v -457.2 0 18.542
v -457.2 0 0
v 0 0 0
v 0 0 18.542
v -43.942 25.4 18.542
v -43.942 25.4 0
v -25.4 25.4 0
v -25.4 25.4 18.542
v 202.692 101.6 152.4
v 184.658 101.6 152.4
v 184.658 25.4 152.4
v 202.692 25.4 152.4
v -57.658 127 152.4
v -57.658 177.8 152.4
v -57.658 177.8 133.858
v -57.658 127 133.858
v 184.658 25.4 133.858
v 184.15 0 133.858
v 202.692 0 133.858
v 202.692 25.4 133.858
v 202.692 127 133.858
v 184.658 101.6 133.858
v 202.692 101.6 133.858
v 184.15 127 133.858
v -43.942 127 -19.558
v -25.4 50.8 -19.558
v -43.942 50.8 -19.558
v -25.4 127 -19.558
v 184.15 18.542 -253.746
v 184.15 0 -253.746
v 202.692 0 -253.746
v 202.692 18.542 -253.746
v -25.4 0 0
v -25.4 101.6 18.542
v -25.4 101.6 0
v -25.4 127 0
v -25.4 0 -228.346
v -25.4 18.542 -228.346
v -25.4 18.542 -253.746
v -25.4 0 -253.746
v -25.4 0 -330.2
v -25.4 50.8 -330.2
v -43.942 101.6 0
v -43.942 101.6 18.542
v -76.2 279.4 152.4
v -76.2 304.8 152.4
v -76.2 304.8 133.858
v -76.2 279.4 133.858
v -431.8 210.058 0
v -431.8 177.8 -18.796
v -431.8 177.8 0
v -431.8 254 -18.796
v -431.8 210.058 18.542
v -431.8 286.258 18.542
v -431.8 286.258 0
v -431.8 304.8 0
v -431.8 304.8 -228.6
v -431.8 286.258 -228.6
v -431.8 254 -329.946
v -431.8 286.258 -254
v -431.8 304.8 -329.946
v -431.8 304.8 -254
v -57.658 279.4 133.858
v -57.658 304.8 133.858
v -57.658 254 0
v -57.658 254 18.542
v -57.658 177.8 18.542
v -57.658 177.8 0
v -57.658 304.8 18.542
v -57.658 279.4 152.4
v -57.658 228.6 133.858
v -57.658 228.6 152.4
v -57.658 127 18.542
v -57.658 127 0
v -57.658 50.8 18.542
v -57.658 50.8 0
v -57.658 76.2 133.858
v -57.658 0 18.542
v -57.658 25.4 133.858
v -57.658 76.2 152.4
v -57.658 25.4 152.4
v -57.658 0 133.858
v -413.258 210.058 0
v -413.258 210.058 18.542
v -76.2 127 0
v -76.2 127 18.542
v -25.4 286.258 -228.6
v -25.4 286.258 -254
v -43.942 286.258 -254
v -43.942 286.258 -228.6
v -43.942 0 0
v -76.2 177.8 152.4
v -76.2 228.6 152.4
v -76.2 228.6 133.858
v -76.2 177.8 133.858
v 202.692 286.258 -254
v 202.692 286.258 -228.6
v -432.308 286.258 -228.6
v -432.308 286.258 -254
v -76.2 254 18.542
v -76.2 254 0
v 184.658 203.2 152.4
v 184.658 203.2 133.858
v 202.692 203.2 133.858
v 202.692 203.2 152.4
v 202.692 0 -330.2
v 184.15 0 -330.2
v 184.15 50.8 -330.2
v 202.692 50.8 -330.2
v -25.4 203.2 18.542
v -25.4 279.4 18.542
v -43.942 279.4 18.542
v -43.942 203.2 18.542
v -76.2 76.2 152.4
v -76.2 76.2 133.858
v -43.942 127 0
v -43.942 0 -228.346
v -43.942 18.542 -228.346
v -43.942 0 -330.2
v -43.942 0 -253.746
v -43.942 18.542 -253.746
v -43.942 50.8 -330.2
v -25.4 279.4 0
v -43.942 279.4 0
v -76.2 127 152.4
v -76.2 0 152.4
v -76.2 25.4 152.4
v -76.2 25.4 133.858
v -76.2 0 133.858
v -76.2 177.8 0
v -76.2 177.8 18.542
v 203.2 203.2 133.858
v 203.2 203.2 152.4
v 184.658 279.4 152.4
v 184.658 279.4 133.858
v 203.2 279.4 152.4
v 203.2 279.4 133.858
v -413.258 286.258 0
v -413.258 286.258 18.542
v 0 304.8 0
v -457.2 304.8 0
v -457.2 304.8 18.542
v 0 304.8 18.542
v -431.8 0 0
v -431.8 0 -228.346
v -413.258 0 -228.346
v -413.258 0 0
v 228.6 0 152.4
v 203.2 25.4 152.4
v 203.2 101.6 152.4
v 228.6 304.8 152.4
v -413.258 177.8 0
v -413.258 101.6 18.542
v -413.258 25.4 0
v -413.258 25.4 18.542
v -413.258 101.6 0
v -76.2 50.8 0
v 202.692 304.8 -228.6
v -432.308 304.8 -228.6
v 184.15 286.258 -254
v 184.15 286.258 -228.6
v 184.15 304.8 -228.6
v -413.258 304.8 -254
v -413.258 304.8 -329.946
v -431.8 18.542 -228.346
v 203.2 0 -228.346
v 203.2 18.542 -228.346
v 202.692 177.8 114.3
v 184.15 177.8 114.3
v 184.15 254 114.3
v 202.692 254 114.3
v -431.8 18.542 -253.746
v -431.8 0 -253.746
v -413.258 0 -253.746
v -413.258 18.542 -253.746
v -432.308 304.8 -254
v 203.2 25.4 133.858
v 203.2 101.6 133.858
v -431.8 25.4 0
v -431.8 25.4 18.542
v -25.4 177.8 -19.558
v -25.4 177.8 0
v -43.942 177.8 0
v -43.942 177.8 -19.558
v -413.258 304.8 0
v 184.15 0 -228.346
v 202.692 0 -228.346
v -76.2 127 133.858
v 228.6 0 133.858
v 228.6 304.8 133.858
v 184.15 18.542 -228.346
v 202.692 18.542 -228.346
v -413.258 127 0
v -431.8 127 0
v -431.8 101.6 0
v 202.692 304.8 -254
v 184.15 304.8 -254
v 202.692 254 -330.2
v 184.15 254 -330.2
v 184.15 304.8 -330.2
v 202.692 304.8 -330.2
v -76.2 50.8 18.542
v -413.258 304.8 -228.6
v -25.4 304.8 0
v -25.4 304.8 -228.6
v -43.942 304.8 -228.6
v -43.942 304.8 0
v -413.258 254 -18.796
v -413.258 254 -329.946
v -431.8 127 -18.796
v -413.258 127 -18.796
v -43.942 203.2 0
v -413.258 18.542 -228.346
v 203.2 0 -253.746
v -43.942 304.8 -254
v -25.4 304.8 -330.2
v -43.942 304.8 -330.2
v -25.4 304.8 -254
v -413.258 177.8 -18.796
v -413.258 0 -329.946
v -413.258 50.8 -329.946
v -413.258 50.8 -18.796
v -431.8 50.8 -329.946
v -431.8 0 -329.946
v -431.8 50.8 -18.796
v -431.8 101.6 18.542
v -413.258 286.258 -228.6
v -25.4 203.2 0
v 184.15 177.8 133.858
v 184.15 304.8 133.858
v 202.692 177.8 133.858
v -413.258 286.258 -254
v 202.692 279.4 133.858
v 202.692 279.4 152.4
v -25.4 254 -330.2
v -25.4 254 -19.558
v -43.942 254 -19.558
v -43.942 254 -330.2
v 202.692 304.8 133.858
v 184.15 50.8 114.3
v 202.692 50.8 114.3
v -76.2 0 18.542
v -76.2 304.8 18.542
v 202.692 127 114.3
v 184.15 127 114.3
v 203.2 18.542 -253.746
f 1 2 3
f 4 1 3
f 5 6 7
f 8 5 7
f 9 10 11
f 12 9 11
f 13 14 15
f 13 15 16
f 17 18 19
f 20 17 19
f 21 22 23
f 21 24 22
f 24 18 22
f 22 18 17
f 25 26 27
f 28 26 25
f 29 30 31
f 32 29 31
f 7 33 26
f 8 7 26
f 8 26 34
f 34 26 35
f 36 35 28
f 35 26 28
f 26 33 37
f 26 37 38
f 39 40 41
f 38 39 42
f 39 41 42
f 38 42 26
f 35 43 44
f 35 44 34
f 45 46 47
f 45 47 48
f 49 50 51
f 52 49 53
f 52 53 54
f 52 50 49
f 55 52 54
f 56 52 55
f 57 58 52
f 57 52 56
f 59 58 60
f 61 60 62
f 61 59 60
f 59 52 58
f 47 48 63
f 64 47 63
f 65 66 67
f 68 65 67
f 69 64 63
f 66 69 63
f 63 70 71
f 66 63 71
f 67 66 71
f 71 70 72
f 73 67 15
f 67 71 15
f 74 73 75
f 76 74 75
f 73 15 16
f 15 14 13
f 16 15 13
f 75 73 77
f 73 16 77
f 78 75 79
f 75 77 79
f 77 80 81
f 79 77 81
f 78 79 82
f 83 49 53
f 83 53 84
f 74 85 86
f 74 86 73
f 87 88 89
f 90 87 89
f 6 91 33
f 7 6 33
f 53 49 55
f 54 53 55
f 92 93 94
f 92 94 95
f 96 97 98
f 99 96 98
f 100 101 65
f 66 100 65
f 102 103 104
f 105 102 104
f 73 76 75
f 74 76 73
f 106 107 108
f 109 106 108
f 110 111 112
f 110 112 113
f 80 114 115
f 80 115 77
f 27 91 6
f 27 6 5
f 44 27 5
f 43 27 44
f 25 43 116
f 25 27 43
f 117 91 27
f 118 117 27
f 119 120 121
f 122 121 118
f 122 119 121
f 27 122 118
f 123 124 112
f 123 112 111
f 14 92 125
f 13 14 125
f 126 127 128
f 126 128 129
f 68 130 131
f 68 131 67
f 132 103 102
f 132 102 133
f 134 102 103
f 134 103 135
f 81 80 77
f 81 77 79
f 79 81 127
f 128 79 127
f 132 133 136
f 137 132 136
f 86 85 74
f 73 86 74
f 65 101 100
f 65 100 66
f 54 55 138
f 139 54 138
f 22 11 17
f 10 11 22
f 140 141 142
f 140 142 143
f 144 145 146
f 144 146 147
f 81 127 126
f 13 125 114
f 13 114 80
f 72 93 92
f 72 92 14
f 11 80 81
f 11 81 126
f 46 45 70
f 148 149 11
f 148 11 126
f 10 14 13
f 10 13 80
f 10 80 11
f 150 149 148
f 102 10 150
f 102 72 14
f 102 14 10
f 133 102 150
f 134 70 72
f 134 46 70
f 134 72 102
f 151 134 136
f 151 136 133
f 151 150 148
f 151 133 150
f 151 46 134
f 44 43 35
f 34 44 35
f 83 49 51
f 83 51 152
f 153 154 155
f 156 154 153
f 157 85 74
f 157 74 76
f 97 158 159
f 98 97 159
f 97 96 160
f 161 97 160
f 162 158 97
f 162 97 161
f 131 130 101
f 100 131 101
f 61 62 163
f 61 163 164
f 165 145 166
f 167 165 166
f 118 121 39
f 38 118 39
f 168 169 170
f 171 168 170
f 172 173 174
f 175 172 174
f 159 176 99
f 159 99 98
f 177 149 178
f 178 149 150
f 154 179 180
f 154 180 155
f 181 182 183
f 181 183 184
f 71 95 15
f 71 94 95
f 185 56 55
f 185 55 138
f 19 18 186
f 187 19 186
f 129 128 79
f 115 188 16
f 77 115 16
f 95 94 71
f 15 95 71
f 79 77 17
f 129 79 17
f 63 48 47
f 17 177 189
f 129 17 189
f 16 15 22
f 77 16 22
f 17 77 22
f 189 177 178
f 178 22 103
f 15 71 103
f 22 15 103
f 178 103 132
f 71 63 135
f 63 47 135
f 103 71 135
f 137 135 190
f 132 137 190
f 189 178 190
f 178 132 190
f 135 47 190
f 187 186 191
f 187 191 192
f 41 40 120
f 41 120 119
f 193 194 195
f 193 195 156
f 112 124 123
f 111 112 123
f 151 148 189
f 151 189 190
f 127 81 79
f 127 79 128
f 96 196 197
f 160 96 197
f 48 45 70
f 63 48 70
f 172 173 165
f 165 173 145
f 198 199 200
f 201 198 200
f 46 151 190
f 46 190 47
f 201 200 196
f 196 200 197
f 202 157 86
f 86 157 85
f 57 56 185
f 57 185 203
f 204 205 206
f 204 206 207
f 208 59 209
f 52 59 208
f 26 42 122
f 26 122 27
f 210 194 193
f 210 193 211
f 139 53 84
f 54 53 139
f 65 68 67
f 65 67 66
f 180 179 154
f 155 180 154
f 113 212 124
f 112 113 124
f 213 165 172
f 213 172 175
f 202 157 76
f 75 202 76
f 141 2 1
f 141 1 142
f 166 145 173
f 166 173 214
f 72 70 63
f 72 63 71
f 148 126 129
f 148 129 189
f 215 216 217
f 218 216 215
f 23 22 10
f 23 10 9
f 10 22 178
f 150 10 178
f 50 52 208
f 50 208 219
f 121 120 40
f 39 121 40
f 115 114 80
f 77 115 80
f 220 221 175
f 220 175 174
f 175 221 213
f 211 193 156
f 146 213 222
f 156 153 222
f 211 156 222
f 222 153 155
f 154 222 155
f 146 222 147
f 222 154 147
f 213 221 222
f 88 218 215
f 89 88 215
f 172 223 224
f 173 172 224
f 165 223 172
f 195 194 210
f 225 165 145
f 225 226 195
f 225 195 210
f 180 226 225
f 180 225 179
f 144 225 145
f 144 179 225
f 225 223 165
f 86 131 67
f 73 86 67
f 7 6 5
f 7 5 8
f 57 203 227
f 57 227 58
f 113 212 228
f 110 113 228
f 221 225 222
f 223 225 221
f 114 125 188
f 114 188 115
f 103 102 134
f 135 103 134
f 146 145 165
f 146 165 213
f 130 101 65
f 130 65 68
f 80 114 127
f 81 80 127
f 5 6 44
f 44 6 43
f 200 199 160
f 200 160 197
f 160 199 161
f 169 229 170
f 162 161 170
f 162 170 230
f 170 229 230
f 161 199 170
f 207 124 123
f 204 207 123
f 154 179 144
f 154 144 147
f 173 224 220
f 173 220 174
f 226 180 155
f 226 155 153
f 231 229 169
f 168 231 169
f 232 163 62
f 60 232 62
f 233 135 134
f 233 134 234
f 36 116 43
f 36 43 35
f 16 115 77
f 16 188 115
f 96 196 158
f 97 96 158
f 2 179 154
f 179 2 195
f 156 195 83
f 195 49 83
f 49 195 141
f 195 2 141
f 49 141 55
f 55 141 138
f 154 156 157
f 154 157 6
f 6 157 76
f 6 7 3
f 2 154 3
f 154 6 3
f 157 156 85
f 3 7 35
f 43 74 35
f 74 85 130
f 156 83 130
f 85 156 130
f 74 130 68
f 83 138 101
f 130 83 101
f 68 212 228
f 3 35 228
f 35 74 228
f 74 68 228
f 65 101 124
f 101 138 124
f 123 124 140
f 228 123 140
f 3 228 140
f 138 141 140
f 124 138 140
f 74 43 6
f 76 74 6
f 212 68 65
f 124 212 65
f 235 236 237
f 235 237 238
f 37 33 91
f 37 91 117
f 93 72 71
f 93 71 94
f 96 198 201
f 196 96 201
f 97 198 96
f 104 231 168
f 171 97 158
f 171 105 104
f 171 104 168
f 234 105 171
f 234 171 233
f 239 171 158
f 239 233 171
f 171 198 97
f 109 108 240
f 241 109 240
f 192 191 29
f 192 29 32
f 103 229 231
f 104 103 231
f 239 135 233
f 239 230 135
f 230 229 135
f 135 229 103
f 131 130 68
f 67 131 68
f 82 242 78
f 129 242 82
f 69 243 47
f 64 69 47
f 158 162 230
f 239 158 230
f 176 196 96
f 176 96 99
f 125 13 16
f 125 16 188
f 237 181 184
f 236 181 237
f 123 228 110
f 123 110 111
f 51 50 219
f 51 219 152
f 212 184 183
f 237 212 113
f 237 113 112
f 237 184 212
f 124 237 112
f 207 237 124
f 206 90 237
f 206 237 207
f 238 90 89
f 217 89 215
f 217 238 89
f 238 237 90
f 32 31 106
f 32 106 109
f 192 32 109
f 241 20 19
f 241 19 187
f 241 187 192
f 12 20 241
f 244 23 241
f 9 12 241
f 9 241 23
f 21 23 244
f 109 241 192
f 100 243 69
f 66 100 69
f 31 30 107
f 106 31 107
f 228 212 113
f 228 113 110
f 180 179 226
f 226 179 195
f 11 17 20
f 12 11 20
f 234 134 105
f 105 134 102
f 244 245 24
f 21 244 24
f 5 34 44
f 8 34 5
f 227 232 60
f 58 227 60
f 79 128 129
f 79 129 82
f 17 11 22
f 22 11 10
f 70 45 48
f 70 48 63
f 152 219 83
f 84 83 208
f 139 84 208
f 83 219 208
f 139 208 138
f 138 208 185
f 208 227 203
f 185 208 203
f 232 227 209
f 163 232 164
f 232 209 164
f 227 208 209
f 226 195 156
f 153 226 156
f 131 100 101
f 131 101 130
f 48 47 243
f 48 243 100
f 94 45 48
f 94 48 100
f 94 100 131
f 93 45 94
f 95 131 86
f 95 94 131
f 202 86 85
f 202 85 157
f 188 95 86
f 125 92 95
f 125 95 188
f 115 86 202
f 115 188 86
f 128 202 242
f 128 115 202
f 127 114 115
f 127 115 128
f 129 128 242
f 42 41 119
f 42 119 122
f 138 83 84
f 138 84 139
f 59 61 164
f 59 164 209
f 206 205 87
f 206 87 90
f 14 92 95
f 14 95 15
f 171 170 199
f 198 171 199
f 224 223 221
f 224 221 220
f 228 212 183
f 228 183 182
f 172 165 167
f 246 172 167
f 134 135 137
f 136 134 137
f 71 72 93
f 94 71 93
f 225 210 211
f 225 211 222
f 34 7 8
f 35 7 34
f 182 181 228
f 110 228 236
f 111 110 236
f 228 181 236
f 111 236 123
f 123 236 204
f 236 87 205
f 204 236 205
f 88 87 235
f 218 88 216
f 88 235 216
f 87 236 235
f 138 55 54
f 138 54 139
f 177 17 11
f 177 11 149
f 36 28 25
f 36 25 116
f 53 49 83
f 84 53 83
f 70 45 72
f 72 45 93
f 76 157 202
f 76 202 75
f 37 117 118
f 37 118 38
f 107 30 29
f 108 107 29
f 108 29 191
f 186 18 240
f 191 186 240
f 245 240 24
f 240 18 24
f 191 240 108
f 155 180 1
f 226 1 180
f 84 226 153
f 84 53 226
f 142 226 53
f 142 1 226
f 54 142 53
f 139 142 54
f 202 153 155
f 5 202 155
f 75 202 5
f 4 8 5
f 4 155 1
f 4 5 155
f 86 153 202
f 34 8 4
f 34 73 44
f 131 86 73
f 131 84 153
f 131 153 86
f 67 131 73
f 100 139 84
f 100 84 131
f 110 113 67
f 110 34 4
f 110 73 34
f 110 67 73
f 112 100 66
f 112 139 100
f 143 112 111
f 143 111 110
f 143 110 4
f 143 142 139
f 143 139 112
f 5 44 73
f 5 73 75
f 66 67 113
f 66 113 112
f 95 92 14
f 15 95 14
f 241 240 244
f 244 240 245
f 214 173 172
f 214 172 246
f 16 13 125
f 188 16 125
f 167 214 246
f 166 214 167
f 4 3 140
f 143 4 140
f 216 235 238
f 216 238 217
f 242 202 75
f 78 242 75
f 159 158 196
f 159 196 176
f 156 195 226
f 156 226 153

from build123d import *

# Parameters (mm, degrees)
F1_W      = 457.2
F1_H      = 304.8
F1_W_2    = 18.542
F1_H_2    = 76.2
F2_DEPTH  = 18.542
F4_W      = 18.542
F4_H      = 76.2
F5_DEPTH  = 18.542
F6_W      = 304.8
F6_H      = 152.4
F7_DEPTH  = 18.542
F11_DEPTH = 18.542
F18_DEPTH = 18.542
F24_DEPTH = 18.542
F27_W     = 635
F27_H     = 25.4
F28_DEPTH = 18.542
F29_W     = 635
F29_H     = 25.4
F30_DEPTH = 18.542


# Not quite as in the source:
# - a variable given as a bare number and used for a length is read in inches; the dataset says mm whatever the document's units were
# - a feature names something its author has since deleted; it is built from what else it names


with BuildPart() as f2:
    # F1 (on Top) → F2 (new body)
    with BuildSketch(Plane.XY):
        with Locations((-228.6, 152.4)):
            Rectangle(F1_W, F1_H)
        with Locations((-422.529, 63.5)):
            Rectangle(F1_W_2, F1_H_2, mode=Mode.SUBTRACT)
        with Locations((-34.671, 63.5)):
            Rectangle(F1_W_2, F1_H_2, mode=Mode.SUBTRACT)
        with Locations((-66.929, 88.9)):
            Rectangle(F1_W_2, F1_H_2, mode=Mode.SUBTRACT)
        with Locations((-422.529, 248.158)):
            Rectangle(F1_W_2, F1_H_2, mode=Mode.SUBTRACT)
        with Locations((-66.929, 215.9)):
            Rectangle(F1_W_2, F1_H_2, mode=Mode.SUBTRACT)
        with Locations((-34.671, 241.3)):
            Rectangle(F1_W_2, F1_H_2, mode=Mode.SUBTRACT)
    extrude(amount=F2_DEPTH)


with BuildPart() as f5:
    # F4 (on offset) → F5 (new body)
    with BuildSketch(Plane.XY.offset(152.4)):
        Polygon((-76.2, 25.4), (-76.2, 0), (228.6, 0), (228.6, 304.8), (-76.2, 304.8), (-76.2, 279.4), (-57.658, 279.4), (-57.658, 228.6), (-76.2, 228.6), (-76.2, 177.8), (-57.658, 177.8), (-57.658, 127), (-76.2, 127), (-76.2, 76.2), (-57.658, 76.2), (-57.658, 25.4), align=None)
        with Locations((193.929, 63.5)):
            Rectangle(F4_W, F4_H, mode=Mode.SUBTRACT)
        with Locations((193.929, 241.3)):
            Rectangle(F4_W, F4_H, mode=Mode.SUBTRACT)
    extrude(amount=-F5_DEPTH)


with BuildPart() as f7:
    # F6 (on face) → F7 (new body)
    with BuildSketch(Plane(origin=(-76.2, 0, 0), x_dir=(0, -1, 0), z_dir=(-1, 0, 0))):
        with Locations((-152.4, 76.2)):
            Rectangle(F6_W, F6_H)
    extrude(amount=-F7_DEPTH)

    # F8: cut F5
    add(f5.part, mode=Mode.SUBTRACT)

    # F16: cut F2
    add(f2.part, mode=Mode.SUBTRACT)


with BuildPart() as f11:
    # F10 (on Right) → F11 (new body)
    with BuildSketch(Plane.YZ):
        Polygon((127, 152.4), (0, 152.4), (0, -330.2), (50.8, -330.2), (50.8, 114.3), (127, 114.3), align=None)
    extrude(amount=F11_DEPTH)


with BuildPart() as f11b:
    # F10 (on Right) → F11, piece 2 (new body)
    with BuildSketch(Plane.YZ):
        Polygon((254, 114.3), (254, -330.2), (304.8, -330.2), (304.8, 152.4), (177.8, 152.4), (177.8, 114.3), align=None)
    extrude(amount=F11_DEPTH)


with BuildPart() as f11_1:
    # F12: moved
    add(f11.part.moved(Location((184.15, 0, 0))))

    # F13: cut F5
    add(f5.part, mode=Mode.SUBTRACT)


with BuildPart() as f11b_1:
    # F14: moved
    add(f11b.part.moved(Location((184.15, 0, 0))))

    # F15: cut F5
    add(f5.part, mode=Mode.SUBTRACT)


with BuildPart() as f18:
    # F17 (on Right) → F18 (new body)
    with BuildSketch(Plane.YZ):
        Polygon((127, 18.542), (0, 18.542), (0, -330.2), (50.8, -330.2), (50.8, -19.558), (127, -19.558), align=None)
    extrude(amount=-F18_DEPTH)


with BuildPart() as f18b:
    # F17 (on Right) → F18, piece 2 (new body)
    with BuildSketch(Plane.YZ):
        Polygon((304.8, 18.542), (177.8, 18.542), (177.8, -19.558), (254, -19.558), (254, -330.2), (304.8, -330.2), align=None)
    extrude(amount=-F18_DEPTH)


with BuildPart() as f18_1:
    # F19: moved
    add(f18.part.moved(Location((-25.4, 0, 0))))

    # F20: cut F2
    add(f2.part, mode=Mode.SUBTRACT)


with BuildPart() as f18b_1:
    # F21: moved
    add(f18b.part.moved(Location((-25.4, 0, 0))))

    # F22: cut F2
    add(f2.part, mode=Mode.SUBTRACT)


with BuildPart() as f24:
    # F23 (on face) → F24 (new body)
    with BuildSketch(Plane(origin=(-457.2, 0, 0), x_dir=(0, -1, 0), z_dir=(-1, 0, 0))):
        Polygon((-177.8, 18.542), (-304.8, 18.542), (-304.8, -329.946), (-254, -329.946), (-254, -18.796), (-177.8, -18.796), align=None)
    extrude(amount=-F24_DEPTH)


with BuildPart() as f24b:
    # F23 (on face) → F24, piece 2 (new body)
    with BuildSketch(Plane(origin=(-457.2, 0, 0), x_dir=(0, -1, 0), z_dir=(-1, 0, 0))):
        Polygon((-50.8, -18.796), (-50.8, -329.946), (0, -329.946), (0, 18.542), (-127, 18.542), (-127, -18.796), align=None)
    extrude(amount=-F24_DEPTH)


with BuildPart() as f24_1:
    # F25: moved
    add(f24.part.moved(Location((25.4, 0, 0))))

    # F26: cut F2
    add(f2.part, mode=Mode.SUBTRACT)


with BuildPart() as f24b_1:
    # F25: moved
    add(f24b.part.moved(Location((25.4, 0, 0))))

    # F26: cut F2
    add(f2.part, mode=Mode.SUBTRACT)


with BuildPart() as f28:
    # F27 (on face) → F28 (new body)
    with BuildSketch(Plane.XZ):
        with Locations((-114.3, -241.046)):
            Rectangle(F27_W, F27_H)
    extrude(amount=-F28_DEPTH)


with BuildPart() as f30:
    # F29 (on face) → F30 (new body)
    with BuildSketch(Plane(origin=(0, 304.8, 0), x_dir=(-1, 0, 0), z_dir=(0, 1, 0))):
        with Locations((114.808, -241.3)):
            Rectangle(F29_W, F29_H)
    extrude(amount=-F30_DEPTH)


with BuildPart() as f24b_2:
    add(f24b_1.part)

    # F31: cut F28
    add(f28.part, mode=Mode.SUBTRACT)


with BuildPart() as f18_2:
    add(f18_1.part)

    # F31: cut F28
    add(f28.part, mode=Mode.SUBTRACT)


with BuildPart() as f11_2:
    add(f11_1.part)

    # F31: cut F28
    add(f28.part, mode=Mode.SUBTRACT)


with BuildPart() as f11b_2:
    add(f11b_1.part)

    # F32: cut F30
    add(f30.part, mode=Mode.SUBTRACT)


with BuildPart() as f18b_2:
    add(f18b_1.part)

    # F32: cut F30
    add(f30.part, mode=Mode.SUBTRACT)


with BuildPart() as f24_2:
    add(f24_1.part)

    # F32: cut F30
    add(f30.part, mode=Mode.SUBTRACT)


solid = Compound([f2.part, f5.part, f7.part, f28.part, f30.part, f24b_2.part, f18_2.part, f11_2.part, f11b_2.part, f18b_2.part, f24_2.part])
